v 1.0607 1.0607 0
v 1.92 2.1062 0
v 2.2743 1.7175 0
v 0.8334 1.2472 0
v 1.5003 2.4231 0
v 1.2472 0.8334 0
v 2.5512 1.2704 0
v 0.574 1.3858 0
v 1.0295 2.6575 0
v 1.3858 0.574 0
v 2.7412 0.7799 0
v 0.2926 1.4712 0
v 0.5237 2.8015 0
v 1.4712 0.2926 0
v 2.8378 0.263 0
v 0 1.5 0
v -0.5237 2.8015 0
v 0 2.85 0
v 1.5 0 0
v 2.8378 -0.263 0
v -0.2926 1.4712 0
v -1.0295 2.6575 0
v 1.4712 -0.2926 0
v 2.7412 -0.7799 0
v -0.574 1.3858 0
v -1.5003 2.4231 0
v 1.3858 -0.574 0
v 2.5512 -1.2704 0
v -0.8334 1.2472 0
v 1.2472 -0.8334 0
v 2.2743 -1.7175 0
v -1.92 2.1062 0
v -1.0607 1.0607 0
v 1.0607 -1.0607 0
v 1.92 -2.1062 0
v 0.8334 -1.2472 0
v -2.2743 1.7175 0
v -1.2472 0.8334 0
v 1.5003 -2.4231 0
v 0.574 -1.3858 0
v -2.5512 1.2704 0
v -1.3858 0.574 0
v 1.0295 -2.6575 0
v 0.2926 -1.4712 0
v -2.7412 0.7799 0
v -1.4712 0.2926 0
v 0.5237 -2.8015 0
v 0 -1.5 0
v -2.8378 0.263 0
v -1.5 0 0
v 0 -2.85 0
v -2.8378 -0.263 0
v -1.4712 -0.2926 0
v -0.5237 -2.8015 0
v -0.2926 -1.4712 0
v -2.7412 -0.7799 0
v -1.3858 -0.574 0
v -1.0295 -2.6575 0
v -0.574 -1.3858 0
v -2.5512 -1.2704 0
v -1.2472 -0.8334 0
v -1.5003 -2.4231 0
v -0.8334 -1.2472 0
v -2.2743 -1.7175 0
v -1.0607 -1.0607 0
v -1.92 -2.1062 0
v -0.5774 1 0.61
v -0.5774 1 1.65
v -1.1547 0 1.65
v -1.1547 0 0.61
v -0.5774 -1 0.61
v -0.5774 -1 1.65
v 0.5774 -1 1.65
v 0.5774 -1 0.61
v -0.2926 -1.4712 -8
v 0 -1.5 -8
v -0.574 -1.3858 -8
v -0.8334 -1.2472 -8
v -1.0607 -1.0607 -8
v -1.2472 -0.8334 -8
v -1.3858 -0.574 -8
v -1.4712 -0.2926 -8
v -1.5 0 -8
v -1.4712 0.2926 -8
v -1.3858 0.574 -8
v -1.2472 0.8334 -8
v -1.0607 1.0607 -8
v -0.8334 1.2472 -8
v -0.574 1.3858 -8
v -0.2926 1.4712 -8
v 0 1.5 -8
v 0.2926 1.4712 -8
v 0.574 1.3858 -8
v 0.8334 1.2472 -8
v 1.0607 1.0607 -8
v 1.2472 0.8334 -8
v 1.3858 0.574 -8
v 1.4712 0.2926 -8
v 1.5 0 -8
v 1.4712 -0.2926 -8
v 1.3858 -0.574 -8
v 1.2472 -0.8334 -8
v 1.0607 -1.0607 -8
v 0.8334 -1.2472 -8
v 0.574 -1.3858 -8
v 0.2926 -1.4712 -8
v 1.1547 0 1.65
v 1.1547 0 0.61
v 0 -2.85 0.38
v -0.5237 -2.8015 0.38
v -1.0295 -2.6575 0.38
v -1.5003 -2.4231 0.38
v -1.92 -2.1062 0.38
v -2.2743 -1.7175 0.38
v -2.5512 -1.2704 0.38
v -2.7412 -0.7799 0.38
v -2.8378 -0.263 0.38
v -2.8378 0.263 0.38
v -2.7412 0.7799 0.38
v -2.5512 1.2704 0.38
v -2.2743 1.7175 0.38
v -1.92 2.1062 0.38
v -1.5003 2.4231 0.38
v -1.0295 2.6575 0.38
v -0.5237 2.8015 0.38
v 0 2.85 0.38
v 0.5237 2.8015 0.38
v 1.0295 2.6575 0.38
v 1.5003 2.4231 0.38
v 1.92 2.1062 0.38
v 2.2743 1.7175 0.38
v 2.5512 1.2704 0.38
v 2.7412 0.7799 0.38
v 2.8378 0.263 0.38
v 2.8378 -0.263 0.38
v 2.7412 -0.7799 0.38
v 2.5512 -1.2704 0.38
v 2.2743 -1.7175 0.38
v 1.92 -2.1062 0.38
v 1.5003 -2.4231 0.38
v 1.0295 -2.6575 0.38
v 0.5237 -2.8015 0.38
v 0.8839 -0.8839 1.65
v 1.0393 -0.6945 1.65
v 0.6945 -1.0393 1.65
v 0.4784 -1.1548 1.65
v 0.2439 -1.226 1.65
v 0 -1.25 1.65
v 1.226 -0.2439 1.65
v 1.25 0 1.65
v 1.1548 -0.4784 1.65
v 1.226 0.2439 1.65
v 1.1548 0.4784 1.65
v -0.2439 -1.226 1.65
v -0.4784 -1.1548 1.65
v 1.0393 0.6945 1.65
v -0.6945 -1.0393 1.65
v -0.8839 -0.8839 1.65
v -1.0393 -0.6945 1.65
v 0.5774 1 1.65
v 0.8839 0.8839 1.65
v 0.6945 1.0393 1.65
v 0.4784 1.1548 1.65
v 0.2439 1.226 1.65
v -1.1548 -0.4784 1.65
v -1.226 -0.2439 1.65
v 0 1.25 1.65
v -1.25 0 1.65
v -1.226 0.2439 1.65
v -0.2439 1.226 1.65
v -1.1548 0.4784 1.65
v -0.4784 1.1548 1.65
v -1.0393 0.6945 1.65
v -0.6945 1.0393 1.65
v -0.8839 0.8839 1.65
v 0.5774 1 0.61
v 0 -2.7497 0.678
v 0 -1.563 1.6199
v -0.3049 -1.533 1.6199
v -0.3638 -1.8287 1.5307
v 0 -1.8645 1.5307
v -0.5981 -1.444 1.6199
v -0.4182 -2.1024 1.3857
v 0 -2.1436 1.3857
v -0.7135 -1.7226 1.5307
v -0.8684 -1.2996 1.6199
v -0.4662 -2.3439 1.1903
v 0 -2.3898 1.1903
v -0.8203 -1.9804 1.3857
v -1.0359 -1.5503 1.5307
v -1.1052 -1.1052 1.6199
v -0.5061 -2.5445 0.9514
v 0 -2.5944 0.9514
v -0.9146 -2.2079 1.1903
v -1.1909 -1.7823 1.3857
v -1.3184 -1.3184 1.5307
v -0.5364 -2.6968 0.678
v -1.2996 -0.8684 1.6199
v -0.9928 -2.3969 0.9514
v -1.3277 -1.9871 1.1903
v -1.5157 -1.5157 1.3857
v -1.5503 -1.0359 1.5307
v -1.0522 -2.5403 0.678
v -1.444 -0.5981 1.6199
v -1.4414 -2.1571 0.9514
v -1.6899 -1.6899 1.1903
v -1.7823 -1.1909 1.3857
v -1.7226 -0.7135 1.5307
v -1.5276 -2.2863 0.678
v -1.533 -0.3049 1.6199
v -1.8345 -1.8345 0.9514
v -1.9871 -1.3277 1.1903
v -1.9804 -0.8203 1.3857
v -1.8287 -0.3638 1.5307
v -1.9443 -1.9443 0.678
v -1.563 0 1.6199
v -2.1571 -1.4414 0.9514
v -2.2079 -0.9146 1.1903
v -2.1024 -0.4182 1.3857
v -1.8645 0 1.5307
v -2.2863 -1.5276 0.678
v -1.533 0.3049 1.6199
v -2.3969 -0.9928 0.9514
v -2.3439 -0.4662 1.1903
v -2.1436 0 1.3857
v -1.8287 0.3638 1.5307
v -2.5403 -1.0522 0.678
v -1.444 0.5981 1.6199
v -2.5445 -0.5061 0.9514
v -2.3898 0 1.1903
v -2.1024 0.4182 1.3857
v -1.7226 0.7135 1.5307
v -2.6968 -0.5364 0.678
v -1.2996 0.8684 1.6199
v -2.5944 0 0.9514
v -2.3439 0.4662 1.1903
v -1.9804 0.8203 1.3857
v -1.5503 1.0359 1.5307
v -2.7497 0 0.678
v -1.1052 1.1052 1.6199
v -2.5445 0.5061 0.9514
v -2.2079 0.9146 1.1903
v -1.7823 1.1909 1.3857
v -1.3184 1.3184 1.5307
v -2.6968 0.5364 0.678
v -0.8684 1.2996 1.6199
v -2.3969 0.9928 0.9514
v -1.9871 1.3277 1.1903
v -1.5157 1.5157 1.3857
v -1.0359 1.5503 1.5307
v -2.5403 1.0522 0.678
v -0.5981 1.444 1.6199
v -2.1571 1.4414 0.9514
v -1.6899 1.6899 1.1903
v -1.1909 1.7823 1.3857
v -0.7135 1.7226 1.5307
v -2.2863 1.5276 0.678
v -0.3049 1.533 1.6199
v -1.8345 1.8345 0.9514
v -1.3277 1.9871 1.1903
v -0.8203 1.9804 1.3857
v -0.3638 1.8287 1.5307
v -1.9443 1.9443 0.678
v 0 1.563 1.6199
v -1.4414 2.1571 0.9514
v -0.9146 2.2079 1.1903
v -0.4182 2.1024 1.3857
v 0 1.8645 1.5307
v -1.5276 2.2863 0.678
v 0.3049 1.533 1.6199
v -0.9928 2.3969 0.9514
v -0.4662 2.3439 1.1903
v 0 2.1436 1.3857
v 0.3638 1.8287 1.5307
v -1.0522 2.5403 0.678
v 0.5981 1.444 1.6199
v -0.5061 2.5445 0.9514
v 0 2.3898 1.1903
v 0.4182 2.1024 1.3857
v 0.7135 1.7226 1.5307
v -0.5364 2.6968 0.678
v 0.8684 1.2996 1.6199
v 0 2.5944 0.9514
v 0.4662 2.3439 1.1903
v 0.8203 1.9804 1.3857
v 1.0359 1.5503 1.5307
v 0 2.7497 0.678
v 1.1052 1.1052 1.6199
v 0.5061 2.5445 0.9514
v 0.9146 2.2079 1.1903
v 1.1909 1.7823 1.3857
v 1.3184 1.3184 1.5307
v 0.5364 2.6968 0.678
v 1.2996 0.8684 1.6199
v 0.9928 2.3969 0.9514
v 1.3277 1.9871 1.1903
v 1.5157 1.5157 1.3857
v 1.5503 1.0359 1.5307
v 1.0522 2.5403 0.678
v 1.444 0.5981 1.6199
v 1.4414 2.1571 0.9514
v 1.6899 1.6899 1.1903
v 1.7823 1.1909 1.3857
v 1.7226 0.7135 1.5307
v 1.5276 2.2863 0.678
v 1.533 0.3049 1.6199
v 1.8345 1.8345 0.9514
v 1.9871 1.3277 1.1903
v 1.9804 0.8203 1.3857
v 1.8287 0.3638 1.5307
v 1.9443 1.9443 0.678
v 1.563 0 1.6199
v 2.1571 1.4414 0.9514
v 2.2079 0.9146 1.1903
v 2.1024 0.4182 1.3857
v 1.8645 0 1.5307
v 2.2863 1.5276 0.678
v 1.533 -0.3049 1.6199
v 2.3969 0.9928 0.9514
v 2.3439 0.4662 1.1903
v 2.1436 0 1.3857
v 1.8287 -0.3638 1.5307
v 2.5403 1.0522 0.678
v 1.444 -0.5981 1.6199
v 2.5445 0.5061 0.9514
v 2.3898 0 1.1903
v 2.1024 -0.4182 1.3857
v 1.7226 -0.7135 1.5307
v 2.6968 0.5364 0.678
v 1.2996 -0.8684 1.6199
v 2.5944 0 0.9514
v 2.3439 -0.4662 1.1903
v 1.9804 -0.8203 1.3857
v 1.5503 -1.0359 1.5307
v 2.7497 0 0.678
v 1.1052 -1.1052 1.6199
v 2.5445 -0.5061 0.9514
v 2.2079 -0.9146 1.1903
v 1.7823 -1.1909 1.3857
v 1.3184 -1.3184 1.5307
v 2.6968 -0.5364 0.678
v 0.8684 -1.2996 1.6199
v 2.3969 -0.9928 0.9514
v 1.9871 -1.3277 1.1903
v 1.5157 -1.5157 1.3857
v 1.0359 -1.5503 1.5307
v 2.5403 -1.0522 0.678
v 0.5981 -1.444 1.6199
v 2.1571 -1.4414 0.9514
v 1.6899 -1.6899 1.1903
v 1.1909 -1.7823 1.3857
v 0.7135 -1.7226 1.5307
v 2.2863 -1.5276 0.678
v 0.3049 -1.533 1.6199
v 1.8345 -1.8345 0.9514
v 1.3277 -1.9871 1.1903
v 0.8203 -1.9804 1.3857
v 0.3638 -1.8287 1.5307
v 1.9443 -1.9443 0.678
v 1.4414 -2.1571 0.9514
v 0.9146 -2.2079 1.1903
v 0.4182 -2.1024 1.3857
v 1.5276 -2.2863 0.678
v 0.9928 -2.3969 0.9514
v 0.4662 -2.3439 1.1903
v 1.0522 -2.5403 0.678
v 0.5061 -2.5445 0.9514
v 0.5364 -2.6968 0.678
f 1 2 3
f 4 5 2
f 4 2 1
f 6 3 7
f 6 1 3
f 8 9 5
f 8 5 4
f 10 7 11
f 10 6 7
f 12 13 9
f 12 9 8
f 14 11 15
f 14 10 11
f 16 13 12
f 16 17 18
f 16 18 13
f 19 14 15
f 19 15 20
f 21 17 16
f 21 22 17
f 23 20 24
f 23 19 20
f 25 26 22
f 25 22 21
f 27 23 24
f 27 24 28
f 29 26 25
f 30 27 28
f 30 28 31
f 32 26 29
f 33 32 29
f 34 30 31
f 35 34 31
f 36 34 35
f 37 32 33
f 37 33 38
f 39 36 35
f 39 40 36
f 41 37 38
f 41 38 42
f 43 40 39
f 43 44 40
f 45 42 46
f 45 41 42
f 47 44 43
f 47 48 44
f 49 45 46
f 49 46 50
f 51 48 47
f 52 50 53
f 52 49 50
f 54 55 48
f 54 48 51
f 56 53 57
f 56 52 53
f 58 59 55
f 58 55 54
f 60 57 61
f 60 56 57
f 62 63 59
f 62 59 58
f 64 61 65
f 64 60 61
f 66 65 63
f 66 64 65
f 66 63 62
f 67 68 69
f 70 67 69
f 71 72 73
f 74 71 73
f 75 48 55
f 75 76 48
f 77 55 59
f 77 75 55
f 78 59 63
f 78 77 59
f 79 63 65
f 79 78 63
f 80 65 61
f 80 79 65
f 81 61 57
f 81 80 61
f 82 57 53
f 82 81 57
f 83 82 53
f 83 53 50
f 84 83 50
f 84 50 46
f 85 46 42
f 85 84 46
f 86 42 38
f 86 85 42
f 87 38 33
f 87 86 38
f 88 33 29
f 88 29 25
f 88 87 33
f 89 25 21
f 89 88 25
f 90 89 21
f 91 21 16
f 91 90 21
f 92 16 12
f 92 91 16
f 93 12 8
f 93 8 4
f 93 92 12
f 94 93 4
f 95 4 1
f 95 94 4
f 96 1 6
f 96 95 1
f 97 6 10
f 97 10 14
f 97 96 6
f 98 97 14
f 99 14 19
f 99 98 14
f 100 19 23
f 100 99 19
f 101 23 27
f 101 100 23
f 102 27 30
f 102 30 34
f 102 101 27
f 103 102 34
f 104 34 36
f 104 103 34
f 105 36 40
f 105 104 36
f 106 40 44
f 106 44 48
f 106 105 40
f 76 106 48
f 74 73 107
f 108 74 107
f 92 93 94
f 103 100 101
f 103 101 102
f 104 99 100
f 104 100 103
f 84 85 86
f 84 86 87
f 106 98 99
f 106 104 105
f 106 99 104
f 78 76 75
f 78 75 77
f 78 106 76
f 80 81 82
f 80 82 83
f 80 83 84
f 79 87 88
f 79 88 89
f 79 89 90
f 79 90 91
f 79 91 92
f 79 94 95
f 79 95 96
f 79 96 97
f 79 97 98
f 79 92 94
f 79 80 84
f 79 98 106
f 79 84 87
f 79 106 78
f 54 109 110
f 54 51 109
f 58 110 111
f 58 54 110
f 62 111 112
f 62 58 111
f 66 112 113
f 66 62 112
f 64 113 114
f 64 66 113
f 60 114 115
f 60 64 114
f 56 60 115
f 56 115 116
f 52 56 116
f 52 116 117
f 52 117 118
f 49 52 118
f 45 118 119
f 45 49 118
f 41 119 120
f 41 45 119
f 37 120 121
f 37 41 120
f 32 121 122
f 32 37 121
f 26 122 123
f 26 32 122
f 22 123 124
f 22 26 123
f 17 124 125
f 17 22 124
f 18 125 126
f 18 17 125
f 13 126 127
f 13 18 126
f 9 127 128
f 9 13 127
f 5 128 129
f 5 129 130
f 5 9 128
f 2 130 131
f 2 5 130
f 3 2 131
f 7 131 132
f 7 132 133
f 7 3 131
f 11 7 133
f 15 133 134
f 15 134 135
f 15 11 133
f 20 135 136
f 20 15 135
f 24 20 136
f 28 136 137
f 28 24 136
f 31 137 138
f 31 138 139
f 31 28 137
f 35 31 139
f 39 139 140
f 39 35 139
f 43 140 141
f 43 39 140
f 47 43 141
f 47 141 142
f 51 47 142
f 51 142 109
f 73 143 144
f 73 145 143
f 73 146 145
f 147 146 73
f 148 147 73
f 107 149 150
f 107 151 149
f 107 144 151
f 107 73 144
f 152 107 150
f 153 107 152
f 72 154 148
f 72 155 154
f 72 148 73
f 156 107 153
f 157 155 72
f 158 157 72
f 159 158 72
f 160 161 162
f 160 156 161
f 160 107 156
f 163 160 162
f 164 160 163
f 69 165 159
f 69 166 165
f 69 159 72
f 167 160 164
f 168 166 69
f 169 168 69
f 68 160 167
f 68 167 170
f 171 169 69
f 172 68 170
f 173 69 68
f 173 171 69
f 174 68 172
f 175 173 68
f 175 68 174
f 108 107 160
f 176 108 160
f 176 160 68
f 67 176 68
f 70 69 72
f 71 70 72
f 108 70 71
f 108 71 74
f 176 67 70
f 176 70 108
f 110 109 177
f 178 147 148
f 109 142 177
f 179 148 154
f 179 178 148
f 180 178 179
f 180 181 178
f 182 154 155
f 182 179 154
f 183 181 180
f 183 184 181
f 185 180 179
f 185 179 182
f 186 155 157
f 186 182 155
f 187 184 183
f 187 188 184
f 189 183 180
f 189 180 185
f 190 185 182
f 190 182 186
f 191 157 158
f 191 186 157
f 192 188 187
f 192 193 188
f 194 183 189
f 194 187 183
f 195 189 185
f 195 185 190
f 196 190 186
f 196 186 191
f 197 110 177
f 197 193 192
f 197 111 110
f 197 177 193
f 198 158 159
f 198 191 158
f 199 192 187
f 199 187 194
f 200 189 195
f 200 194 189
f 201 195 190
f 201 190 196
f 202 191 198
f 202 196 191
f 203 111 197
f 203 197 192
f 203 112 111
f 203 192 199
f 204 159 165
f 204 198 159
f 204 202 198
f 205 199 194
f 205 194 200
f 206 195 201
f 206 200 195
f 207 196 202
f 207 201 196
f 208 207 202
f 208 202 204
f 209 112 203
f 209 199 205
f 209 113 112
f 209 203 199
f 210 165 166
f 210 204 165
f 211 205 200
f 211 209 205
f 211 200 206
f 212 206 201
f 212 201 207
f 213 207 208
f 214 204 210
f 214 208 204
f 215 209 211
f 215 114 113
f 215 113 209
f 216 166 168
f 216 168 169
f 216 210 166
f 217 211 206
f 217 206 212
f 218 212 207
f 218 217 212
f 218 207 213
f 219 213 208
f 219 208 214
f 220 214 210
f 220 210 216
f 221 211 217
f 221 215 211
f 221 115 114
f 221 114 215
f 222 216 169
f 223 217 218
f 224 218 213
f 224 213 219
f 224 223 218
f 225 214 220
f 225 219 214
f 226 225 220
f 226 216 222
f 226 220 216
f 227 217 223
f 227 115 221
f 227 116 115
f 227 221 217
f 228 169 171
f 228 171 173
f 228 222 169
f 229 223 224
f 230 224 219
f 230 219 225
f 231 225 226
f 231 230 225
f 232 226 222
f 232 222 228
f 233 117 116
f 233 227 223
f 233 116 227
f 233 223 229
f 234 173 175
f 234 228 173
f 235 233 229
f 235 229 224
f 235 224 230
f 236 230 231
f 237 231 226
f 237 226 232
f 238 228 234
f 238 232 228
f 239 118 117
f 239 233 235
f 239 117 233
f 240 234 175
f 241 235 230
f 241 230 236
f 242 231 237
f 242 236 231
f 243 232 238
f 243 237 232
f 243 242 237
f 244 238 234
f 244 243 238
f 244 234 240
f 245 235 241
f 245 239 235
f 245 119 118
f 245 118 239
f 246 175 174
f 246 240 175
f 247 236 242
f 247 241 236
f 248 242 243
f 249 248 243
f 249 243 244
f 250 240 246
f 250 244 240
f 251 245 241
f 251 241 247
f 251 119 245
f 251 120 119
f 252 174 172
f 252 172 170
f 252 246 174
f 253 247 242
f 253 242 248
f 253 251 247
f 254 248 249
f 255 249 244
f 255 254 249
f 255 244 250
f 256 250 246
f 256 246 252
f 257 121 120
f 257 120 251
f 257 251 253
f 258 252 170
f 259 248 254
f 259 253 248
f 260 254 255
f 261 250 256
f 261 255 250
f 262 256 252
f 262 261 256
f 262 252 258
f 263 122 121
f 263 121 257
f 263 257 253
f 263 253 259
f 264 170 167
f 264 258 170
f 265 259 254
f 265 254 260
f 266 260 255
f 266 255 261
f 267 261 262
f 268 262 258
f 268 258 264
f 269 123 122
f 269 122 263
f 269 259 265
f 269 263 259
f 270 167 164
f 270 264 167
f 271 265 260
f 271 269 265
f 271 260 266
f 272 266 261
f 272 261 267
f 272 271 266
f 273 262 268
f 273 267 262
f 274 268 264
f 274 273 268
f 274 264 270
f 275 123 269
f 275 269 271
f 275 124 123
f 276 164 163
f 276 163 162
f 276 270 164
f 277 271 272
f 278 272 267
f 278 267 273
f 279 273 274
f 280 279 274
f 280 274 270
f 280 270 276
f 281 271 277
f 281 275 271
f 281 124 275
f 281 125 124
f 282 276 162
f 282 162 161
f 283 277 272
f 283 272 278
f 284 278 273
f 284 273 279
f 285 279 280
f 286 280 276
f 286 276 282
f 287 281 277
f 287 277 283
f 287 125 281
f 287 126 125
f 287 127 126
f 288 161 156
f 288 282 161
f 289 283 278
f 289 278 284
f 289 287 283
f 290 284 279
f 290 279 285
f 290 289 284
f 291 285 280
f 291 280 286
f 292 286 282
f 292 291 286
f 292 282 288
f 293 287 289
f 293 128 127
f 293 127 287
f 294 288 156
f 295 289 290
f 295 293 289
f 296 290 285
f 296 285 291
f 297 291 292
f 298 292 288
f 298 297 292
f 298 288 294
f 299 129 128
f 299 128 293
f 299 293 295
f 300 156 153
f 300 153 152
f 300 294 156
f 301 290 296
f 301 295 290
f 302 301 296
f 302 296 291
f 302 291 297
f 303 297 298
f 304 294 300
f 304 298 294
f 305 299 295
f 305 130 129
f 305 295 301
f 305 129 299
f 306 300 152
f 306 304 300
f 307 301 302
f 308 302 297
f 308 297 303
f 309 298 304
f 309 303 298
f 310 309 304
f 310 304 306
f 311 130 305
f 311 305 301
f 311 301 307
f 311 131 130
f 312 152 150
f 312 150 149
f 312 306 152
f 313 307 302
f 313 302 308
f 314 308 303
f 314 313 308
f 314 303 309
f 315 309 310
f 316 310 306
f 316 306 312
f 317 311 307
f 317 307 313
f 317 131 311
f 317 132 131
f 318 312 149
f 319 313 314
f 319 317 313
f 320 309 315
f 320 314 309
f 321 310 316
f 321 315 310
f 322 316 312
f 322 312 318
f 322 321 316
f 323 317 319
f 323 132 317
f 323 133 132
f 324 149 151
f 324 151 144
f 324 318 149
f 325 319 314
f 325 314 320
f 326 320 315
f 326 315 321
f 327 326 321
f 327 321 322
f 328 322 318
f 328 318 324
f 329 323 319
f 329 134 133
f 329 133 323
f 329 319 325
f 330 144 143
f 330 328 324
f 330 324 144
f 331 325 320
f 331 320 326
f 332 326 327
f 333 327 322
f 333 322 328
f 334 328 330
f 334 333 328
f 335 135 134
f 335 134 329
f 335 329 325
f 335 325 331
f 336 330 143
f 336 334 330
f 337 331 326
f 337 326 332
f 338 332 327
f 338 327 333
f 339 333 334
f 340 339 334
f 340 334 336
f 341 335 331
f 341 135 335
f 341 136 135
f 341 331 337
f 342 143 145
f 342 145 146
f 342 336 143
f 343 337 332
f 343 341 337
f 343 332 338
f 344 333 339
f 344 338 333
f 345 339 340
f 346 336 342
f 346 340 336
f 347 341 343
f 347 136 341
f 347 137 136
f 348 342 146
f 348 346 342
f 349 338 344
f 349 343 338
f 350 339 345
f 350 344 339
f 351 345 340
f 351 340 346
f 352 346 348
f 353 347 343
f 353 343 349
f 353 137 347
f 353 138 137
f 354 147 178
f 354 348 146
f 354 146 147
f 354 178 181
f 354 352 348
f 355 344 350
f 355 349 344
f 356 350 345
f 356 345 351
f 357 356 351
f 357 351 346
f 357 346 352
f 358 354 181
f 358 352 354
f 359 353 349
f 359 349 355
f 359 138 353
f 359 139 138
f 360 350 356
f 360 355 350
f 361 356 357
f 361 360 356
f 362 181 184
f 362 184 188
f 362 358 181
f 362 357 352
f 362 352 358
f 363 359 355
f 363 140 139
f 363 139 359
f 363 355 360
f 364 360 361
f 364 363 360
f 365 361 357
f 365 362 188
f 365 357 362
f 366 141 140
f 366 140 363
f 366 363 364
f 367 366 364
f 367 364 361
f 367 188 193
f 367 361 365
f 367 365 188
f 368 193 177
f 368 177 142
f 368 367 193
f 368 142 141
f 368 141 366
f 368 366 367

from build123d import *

# Parameters (mm, degrees)
CUT_EXTRUDE1_DEPTH = 1.04


with BuildPart() as part:
    # Sketch1 → Revolve1 (revolve)
    with BuildSketch(Plane(origin=(0, 0, 0), x_dir=(0, 0, -1), z_dir=(1, 0, 0))):
        with BuildLine():
            Line((-1.65, 0), (-1.65, 1.25))
            ThreePointArc((-1.65, 1.25), (-1.293908806, 2.271383865), (-0.38, 2.85))
            Line((-0.38, 2.85), (0, 2.85))
            Line((0, 2.85), (0, 1.5))
            Line((0, 1.5), (8, 1.5))
            Line((8, 1.5), (8, 0))
            Line((8, 0), (-1.65, 0))
        make_face()
    revolve(axis=Axis((0, 0, 5.584882278), (0, 0, -1)))

    # Sketch2 → Cut-Extrude1 (cut)
    with BuildSketch(Plane.XY.offset(1.65)):
        Polygon((0.577350269, -1), (1.154700538, 0), (0.577350269, 1), (-0.577350269, 1), (-1.154700538, 0), (-0.577350269, -1), align=None)
    extrude(amount=-CUT_EXTRUDE1_DEPTH, mode=Mode.SUBTRACT)


solid = part.part
